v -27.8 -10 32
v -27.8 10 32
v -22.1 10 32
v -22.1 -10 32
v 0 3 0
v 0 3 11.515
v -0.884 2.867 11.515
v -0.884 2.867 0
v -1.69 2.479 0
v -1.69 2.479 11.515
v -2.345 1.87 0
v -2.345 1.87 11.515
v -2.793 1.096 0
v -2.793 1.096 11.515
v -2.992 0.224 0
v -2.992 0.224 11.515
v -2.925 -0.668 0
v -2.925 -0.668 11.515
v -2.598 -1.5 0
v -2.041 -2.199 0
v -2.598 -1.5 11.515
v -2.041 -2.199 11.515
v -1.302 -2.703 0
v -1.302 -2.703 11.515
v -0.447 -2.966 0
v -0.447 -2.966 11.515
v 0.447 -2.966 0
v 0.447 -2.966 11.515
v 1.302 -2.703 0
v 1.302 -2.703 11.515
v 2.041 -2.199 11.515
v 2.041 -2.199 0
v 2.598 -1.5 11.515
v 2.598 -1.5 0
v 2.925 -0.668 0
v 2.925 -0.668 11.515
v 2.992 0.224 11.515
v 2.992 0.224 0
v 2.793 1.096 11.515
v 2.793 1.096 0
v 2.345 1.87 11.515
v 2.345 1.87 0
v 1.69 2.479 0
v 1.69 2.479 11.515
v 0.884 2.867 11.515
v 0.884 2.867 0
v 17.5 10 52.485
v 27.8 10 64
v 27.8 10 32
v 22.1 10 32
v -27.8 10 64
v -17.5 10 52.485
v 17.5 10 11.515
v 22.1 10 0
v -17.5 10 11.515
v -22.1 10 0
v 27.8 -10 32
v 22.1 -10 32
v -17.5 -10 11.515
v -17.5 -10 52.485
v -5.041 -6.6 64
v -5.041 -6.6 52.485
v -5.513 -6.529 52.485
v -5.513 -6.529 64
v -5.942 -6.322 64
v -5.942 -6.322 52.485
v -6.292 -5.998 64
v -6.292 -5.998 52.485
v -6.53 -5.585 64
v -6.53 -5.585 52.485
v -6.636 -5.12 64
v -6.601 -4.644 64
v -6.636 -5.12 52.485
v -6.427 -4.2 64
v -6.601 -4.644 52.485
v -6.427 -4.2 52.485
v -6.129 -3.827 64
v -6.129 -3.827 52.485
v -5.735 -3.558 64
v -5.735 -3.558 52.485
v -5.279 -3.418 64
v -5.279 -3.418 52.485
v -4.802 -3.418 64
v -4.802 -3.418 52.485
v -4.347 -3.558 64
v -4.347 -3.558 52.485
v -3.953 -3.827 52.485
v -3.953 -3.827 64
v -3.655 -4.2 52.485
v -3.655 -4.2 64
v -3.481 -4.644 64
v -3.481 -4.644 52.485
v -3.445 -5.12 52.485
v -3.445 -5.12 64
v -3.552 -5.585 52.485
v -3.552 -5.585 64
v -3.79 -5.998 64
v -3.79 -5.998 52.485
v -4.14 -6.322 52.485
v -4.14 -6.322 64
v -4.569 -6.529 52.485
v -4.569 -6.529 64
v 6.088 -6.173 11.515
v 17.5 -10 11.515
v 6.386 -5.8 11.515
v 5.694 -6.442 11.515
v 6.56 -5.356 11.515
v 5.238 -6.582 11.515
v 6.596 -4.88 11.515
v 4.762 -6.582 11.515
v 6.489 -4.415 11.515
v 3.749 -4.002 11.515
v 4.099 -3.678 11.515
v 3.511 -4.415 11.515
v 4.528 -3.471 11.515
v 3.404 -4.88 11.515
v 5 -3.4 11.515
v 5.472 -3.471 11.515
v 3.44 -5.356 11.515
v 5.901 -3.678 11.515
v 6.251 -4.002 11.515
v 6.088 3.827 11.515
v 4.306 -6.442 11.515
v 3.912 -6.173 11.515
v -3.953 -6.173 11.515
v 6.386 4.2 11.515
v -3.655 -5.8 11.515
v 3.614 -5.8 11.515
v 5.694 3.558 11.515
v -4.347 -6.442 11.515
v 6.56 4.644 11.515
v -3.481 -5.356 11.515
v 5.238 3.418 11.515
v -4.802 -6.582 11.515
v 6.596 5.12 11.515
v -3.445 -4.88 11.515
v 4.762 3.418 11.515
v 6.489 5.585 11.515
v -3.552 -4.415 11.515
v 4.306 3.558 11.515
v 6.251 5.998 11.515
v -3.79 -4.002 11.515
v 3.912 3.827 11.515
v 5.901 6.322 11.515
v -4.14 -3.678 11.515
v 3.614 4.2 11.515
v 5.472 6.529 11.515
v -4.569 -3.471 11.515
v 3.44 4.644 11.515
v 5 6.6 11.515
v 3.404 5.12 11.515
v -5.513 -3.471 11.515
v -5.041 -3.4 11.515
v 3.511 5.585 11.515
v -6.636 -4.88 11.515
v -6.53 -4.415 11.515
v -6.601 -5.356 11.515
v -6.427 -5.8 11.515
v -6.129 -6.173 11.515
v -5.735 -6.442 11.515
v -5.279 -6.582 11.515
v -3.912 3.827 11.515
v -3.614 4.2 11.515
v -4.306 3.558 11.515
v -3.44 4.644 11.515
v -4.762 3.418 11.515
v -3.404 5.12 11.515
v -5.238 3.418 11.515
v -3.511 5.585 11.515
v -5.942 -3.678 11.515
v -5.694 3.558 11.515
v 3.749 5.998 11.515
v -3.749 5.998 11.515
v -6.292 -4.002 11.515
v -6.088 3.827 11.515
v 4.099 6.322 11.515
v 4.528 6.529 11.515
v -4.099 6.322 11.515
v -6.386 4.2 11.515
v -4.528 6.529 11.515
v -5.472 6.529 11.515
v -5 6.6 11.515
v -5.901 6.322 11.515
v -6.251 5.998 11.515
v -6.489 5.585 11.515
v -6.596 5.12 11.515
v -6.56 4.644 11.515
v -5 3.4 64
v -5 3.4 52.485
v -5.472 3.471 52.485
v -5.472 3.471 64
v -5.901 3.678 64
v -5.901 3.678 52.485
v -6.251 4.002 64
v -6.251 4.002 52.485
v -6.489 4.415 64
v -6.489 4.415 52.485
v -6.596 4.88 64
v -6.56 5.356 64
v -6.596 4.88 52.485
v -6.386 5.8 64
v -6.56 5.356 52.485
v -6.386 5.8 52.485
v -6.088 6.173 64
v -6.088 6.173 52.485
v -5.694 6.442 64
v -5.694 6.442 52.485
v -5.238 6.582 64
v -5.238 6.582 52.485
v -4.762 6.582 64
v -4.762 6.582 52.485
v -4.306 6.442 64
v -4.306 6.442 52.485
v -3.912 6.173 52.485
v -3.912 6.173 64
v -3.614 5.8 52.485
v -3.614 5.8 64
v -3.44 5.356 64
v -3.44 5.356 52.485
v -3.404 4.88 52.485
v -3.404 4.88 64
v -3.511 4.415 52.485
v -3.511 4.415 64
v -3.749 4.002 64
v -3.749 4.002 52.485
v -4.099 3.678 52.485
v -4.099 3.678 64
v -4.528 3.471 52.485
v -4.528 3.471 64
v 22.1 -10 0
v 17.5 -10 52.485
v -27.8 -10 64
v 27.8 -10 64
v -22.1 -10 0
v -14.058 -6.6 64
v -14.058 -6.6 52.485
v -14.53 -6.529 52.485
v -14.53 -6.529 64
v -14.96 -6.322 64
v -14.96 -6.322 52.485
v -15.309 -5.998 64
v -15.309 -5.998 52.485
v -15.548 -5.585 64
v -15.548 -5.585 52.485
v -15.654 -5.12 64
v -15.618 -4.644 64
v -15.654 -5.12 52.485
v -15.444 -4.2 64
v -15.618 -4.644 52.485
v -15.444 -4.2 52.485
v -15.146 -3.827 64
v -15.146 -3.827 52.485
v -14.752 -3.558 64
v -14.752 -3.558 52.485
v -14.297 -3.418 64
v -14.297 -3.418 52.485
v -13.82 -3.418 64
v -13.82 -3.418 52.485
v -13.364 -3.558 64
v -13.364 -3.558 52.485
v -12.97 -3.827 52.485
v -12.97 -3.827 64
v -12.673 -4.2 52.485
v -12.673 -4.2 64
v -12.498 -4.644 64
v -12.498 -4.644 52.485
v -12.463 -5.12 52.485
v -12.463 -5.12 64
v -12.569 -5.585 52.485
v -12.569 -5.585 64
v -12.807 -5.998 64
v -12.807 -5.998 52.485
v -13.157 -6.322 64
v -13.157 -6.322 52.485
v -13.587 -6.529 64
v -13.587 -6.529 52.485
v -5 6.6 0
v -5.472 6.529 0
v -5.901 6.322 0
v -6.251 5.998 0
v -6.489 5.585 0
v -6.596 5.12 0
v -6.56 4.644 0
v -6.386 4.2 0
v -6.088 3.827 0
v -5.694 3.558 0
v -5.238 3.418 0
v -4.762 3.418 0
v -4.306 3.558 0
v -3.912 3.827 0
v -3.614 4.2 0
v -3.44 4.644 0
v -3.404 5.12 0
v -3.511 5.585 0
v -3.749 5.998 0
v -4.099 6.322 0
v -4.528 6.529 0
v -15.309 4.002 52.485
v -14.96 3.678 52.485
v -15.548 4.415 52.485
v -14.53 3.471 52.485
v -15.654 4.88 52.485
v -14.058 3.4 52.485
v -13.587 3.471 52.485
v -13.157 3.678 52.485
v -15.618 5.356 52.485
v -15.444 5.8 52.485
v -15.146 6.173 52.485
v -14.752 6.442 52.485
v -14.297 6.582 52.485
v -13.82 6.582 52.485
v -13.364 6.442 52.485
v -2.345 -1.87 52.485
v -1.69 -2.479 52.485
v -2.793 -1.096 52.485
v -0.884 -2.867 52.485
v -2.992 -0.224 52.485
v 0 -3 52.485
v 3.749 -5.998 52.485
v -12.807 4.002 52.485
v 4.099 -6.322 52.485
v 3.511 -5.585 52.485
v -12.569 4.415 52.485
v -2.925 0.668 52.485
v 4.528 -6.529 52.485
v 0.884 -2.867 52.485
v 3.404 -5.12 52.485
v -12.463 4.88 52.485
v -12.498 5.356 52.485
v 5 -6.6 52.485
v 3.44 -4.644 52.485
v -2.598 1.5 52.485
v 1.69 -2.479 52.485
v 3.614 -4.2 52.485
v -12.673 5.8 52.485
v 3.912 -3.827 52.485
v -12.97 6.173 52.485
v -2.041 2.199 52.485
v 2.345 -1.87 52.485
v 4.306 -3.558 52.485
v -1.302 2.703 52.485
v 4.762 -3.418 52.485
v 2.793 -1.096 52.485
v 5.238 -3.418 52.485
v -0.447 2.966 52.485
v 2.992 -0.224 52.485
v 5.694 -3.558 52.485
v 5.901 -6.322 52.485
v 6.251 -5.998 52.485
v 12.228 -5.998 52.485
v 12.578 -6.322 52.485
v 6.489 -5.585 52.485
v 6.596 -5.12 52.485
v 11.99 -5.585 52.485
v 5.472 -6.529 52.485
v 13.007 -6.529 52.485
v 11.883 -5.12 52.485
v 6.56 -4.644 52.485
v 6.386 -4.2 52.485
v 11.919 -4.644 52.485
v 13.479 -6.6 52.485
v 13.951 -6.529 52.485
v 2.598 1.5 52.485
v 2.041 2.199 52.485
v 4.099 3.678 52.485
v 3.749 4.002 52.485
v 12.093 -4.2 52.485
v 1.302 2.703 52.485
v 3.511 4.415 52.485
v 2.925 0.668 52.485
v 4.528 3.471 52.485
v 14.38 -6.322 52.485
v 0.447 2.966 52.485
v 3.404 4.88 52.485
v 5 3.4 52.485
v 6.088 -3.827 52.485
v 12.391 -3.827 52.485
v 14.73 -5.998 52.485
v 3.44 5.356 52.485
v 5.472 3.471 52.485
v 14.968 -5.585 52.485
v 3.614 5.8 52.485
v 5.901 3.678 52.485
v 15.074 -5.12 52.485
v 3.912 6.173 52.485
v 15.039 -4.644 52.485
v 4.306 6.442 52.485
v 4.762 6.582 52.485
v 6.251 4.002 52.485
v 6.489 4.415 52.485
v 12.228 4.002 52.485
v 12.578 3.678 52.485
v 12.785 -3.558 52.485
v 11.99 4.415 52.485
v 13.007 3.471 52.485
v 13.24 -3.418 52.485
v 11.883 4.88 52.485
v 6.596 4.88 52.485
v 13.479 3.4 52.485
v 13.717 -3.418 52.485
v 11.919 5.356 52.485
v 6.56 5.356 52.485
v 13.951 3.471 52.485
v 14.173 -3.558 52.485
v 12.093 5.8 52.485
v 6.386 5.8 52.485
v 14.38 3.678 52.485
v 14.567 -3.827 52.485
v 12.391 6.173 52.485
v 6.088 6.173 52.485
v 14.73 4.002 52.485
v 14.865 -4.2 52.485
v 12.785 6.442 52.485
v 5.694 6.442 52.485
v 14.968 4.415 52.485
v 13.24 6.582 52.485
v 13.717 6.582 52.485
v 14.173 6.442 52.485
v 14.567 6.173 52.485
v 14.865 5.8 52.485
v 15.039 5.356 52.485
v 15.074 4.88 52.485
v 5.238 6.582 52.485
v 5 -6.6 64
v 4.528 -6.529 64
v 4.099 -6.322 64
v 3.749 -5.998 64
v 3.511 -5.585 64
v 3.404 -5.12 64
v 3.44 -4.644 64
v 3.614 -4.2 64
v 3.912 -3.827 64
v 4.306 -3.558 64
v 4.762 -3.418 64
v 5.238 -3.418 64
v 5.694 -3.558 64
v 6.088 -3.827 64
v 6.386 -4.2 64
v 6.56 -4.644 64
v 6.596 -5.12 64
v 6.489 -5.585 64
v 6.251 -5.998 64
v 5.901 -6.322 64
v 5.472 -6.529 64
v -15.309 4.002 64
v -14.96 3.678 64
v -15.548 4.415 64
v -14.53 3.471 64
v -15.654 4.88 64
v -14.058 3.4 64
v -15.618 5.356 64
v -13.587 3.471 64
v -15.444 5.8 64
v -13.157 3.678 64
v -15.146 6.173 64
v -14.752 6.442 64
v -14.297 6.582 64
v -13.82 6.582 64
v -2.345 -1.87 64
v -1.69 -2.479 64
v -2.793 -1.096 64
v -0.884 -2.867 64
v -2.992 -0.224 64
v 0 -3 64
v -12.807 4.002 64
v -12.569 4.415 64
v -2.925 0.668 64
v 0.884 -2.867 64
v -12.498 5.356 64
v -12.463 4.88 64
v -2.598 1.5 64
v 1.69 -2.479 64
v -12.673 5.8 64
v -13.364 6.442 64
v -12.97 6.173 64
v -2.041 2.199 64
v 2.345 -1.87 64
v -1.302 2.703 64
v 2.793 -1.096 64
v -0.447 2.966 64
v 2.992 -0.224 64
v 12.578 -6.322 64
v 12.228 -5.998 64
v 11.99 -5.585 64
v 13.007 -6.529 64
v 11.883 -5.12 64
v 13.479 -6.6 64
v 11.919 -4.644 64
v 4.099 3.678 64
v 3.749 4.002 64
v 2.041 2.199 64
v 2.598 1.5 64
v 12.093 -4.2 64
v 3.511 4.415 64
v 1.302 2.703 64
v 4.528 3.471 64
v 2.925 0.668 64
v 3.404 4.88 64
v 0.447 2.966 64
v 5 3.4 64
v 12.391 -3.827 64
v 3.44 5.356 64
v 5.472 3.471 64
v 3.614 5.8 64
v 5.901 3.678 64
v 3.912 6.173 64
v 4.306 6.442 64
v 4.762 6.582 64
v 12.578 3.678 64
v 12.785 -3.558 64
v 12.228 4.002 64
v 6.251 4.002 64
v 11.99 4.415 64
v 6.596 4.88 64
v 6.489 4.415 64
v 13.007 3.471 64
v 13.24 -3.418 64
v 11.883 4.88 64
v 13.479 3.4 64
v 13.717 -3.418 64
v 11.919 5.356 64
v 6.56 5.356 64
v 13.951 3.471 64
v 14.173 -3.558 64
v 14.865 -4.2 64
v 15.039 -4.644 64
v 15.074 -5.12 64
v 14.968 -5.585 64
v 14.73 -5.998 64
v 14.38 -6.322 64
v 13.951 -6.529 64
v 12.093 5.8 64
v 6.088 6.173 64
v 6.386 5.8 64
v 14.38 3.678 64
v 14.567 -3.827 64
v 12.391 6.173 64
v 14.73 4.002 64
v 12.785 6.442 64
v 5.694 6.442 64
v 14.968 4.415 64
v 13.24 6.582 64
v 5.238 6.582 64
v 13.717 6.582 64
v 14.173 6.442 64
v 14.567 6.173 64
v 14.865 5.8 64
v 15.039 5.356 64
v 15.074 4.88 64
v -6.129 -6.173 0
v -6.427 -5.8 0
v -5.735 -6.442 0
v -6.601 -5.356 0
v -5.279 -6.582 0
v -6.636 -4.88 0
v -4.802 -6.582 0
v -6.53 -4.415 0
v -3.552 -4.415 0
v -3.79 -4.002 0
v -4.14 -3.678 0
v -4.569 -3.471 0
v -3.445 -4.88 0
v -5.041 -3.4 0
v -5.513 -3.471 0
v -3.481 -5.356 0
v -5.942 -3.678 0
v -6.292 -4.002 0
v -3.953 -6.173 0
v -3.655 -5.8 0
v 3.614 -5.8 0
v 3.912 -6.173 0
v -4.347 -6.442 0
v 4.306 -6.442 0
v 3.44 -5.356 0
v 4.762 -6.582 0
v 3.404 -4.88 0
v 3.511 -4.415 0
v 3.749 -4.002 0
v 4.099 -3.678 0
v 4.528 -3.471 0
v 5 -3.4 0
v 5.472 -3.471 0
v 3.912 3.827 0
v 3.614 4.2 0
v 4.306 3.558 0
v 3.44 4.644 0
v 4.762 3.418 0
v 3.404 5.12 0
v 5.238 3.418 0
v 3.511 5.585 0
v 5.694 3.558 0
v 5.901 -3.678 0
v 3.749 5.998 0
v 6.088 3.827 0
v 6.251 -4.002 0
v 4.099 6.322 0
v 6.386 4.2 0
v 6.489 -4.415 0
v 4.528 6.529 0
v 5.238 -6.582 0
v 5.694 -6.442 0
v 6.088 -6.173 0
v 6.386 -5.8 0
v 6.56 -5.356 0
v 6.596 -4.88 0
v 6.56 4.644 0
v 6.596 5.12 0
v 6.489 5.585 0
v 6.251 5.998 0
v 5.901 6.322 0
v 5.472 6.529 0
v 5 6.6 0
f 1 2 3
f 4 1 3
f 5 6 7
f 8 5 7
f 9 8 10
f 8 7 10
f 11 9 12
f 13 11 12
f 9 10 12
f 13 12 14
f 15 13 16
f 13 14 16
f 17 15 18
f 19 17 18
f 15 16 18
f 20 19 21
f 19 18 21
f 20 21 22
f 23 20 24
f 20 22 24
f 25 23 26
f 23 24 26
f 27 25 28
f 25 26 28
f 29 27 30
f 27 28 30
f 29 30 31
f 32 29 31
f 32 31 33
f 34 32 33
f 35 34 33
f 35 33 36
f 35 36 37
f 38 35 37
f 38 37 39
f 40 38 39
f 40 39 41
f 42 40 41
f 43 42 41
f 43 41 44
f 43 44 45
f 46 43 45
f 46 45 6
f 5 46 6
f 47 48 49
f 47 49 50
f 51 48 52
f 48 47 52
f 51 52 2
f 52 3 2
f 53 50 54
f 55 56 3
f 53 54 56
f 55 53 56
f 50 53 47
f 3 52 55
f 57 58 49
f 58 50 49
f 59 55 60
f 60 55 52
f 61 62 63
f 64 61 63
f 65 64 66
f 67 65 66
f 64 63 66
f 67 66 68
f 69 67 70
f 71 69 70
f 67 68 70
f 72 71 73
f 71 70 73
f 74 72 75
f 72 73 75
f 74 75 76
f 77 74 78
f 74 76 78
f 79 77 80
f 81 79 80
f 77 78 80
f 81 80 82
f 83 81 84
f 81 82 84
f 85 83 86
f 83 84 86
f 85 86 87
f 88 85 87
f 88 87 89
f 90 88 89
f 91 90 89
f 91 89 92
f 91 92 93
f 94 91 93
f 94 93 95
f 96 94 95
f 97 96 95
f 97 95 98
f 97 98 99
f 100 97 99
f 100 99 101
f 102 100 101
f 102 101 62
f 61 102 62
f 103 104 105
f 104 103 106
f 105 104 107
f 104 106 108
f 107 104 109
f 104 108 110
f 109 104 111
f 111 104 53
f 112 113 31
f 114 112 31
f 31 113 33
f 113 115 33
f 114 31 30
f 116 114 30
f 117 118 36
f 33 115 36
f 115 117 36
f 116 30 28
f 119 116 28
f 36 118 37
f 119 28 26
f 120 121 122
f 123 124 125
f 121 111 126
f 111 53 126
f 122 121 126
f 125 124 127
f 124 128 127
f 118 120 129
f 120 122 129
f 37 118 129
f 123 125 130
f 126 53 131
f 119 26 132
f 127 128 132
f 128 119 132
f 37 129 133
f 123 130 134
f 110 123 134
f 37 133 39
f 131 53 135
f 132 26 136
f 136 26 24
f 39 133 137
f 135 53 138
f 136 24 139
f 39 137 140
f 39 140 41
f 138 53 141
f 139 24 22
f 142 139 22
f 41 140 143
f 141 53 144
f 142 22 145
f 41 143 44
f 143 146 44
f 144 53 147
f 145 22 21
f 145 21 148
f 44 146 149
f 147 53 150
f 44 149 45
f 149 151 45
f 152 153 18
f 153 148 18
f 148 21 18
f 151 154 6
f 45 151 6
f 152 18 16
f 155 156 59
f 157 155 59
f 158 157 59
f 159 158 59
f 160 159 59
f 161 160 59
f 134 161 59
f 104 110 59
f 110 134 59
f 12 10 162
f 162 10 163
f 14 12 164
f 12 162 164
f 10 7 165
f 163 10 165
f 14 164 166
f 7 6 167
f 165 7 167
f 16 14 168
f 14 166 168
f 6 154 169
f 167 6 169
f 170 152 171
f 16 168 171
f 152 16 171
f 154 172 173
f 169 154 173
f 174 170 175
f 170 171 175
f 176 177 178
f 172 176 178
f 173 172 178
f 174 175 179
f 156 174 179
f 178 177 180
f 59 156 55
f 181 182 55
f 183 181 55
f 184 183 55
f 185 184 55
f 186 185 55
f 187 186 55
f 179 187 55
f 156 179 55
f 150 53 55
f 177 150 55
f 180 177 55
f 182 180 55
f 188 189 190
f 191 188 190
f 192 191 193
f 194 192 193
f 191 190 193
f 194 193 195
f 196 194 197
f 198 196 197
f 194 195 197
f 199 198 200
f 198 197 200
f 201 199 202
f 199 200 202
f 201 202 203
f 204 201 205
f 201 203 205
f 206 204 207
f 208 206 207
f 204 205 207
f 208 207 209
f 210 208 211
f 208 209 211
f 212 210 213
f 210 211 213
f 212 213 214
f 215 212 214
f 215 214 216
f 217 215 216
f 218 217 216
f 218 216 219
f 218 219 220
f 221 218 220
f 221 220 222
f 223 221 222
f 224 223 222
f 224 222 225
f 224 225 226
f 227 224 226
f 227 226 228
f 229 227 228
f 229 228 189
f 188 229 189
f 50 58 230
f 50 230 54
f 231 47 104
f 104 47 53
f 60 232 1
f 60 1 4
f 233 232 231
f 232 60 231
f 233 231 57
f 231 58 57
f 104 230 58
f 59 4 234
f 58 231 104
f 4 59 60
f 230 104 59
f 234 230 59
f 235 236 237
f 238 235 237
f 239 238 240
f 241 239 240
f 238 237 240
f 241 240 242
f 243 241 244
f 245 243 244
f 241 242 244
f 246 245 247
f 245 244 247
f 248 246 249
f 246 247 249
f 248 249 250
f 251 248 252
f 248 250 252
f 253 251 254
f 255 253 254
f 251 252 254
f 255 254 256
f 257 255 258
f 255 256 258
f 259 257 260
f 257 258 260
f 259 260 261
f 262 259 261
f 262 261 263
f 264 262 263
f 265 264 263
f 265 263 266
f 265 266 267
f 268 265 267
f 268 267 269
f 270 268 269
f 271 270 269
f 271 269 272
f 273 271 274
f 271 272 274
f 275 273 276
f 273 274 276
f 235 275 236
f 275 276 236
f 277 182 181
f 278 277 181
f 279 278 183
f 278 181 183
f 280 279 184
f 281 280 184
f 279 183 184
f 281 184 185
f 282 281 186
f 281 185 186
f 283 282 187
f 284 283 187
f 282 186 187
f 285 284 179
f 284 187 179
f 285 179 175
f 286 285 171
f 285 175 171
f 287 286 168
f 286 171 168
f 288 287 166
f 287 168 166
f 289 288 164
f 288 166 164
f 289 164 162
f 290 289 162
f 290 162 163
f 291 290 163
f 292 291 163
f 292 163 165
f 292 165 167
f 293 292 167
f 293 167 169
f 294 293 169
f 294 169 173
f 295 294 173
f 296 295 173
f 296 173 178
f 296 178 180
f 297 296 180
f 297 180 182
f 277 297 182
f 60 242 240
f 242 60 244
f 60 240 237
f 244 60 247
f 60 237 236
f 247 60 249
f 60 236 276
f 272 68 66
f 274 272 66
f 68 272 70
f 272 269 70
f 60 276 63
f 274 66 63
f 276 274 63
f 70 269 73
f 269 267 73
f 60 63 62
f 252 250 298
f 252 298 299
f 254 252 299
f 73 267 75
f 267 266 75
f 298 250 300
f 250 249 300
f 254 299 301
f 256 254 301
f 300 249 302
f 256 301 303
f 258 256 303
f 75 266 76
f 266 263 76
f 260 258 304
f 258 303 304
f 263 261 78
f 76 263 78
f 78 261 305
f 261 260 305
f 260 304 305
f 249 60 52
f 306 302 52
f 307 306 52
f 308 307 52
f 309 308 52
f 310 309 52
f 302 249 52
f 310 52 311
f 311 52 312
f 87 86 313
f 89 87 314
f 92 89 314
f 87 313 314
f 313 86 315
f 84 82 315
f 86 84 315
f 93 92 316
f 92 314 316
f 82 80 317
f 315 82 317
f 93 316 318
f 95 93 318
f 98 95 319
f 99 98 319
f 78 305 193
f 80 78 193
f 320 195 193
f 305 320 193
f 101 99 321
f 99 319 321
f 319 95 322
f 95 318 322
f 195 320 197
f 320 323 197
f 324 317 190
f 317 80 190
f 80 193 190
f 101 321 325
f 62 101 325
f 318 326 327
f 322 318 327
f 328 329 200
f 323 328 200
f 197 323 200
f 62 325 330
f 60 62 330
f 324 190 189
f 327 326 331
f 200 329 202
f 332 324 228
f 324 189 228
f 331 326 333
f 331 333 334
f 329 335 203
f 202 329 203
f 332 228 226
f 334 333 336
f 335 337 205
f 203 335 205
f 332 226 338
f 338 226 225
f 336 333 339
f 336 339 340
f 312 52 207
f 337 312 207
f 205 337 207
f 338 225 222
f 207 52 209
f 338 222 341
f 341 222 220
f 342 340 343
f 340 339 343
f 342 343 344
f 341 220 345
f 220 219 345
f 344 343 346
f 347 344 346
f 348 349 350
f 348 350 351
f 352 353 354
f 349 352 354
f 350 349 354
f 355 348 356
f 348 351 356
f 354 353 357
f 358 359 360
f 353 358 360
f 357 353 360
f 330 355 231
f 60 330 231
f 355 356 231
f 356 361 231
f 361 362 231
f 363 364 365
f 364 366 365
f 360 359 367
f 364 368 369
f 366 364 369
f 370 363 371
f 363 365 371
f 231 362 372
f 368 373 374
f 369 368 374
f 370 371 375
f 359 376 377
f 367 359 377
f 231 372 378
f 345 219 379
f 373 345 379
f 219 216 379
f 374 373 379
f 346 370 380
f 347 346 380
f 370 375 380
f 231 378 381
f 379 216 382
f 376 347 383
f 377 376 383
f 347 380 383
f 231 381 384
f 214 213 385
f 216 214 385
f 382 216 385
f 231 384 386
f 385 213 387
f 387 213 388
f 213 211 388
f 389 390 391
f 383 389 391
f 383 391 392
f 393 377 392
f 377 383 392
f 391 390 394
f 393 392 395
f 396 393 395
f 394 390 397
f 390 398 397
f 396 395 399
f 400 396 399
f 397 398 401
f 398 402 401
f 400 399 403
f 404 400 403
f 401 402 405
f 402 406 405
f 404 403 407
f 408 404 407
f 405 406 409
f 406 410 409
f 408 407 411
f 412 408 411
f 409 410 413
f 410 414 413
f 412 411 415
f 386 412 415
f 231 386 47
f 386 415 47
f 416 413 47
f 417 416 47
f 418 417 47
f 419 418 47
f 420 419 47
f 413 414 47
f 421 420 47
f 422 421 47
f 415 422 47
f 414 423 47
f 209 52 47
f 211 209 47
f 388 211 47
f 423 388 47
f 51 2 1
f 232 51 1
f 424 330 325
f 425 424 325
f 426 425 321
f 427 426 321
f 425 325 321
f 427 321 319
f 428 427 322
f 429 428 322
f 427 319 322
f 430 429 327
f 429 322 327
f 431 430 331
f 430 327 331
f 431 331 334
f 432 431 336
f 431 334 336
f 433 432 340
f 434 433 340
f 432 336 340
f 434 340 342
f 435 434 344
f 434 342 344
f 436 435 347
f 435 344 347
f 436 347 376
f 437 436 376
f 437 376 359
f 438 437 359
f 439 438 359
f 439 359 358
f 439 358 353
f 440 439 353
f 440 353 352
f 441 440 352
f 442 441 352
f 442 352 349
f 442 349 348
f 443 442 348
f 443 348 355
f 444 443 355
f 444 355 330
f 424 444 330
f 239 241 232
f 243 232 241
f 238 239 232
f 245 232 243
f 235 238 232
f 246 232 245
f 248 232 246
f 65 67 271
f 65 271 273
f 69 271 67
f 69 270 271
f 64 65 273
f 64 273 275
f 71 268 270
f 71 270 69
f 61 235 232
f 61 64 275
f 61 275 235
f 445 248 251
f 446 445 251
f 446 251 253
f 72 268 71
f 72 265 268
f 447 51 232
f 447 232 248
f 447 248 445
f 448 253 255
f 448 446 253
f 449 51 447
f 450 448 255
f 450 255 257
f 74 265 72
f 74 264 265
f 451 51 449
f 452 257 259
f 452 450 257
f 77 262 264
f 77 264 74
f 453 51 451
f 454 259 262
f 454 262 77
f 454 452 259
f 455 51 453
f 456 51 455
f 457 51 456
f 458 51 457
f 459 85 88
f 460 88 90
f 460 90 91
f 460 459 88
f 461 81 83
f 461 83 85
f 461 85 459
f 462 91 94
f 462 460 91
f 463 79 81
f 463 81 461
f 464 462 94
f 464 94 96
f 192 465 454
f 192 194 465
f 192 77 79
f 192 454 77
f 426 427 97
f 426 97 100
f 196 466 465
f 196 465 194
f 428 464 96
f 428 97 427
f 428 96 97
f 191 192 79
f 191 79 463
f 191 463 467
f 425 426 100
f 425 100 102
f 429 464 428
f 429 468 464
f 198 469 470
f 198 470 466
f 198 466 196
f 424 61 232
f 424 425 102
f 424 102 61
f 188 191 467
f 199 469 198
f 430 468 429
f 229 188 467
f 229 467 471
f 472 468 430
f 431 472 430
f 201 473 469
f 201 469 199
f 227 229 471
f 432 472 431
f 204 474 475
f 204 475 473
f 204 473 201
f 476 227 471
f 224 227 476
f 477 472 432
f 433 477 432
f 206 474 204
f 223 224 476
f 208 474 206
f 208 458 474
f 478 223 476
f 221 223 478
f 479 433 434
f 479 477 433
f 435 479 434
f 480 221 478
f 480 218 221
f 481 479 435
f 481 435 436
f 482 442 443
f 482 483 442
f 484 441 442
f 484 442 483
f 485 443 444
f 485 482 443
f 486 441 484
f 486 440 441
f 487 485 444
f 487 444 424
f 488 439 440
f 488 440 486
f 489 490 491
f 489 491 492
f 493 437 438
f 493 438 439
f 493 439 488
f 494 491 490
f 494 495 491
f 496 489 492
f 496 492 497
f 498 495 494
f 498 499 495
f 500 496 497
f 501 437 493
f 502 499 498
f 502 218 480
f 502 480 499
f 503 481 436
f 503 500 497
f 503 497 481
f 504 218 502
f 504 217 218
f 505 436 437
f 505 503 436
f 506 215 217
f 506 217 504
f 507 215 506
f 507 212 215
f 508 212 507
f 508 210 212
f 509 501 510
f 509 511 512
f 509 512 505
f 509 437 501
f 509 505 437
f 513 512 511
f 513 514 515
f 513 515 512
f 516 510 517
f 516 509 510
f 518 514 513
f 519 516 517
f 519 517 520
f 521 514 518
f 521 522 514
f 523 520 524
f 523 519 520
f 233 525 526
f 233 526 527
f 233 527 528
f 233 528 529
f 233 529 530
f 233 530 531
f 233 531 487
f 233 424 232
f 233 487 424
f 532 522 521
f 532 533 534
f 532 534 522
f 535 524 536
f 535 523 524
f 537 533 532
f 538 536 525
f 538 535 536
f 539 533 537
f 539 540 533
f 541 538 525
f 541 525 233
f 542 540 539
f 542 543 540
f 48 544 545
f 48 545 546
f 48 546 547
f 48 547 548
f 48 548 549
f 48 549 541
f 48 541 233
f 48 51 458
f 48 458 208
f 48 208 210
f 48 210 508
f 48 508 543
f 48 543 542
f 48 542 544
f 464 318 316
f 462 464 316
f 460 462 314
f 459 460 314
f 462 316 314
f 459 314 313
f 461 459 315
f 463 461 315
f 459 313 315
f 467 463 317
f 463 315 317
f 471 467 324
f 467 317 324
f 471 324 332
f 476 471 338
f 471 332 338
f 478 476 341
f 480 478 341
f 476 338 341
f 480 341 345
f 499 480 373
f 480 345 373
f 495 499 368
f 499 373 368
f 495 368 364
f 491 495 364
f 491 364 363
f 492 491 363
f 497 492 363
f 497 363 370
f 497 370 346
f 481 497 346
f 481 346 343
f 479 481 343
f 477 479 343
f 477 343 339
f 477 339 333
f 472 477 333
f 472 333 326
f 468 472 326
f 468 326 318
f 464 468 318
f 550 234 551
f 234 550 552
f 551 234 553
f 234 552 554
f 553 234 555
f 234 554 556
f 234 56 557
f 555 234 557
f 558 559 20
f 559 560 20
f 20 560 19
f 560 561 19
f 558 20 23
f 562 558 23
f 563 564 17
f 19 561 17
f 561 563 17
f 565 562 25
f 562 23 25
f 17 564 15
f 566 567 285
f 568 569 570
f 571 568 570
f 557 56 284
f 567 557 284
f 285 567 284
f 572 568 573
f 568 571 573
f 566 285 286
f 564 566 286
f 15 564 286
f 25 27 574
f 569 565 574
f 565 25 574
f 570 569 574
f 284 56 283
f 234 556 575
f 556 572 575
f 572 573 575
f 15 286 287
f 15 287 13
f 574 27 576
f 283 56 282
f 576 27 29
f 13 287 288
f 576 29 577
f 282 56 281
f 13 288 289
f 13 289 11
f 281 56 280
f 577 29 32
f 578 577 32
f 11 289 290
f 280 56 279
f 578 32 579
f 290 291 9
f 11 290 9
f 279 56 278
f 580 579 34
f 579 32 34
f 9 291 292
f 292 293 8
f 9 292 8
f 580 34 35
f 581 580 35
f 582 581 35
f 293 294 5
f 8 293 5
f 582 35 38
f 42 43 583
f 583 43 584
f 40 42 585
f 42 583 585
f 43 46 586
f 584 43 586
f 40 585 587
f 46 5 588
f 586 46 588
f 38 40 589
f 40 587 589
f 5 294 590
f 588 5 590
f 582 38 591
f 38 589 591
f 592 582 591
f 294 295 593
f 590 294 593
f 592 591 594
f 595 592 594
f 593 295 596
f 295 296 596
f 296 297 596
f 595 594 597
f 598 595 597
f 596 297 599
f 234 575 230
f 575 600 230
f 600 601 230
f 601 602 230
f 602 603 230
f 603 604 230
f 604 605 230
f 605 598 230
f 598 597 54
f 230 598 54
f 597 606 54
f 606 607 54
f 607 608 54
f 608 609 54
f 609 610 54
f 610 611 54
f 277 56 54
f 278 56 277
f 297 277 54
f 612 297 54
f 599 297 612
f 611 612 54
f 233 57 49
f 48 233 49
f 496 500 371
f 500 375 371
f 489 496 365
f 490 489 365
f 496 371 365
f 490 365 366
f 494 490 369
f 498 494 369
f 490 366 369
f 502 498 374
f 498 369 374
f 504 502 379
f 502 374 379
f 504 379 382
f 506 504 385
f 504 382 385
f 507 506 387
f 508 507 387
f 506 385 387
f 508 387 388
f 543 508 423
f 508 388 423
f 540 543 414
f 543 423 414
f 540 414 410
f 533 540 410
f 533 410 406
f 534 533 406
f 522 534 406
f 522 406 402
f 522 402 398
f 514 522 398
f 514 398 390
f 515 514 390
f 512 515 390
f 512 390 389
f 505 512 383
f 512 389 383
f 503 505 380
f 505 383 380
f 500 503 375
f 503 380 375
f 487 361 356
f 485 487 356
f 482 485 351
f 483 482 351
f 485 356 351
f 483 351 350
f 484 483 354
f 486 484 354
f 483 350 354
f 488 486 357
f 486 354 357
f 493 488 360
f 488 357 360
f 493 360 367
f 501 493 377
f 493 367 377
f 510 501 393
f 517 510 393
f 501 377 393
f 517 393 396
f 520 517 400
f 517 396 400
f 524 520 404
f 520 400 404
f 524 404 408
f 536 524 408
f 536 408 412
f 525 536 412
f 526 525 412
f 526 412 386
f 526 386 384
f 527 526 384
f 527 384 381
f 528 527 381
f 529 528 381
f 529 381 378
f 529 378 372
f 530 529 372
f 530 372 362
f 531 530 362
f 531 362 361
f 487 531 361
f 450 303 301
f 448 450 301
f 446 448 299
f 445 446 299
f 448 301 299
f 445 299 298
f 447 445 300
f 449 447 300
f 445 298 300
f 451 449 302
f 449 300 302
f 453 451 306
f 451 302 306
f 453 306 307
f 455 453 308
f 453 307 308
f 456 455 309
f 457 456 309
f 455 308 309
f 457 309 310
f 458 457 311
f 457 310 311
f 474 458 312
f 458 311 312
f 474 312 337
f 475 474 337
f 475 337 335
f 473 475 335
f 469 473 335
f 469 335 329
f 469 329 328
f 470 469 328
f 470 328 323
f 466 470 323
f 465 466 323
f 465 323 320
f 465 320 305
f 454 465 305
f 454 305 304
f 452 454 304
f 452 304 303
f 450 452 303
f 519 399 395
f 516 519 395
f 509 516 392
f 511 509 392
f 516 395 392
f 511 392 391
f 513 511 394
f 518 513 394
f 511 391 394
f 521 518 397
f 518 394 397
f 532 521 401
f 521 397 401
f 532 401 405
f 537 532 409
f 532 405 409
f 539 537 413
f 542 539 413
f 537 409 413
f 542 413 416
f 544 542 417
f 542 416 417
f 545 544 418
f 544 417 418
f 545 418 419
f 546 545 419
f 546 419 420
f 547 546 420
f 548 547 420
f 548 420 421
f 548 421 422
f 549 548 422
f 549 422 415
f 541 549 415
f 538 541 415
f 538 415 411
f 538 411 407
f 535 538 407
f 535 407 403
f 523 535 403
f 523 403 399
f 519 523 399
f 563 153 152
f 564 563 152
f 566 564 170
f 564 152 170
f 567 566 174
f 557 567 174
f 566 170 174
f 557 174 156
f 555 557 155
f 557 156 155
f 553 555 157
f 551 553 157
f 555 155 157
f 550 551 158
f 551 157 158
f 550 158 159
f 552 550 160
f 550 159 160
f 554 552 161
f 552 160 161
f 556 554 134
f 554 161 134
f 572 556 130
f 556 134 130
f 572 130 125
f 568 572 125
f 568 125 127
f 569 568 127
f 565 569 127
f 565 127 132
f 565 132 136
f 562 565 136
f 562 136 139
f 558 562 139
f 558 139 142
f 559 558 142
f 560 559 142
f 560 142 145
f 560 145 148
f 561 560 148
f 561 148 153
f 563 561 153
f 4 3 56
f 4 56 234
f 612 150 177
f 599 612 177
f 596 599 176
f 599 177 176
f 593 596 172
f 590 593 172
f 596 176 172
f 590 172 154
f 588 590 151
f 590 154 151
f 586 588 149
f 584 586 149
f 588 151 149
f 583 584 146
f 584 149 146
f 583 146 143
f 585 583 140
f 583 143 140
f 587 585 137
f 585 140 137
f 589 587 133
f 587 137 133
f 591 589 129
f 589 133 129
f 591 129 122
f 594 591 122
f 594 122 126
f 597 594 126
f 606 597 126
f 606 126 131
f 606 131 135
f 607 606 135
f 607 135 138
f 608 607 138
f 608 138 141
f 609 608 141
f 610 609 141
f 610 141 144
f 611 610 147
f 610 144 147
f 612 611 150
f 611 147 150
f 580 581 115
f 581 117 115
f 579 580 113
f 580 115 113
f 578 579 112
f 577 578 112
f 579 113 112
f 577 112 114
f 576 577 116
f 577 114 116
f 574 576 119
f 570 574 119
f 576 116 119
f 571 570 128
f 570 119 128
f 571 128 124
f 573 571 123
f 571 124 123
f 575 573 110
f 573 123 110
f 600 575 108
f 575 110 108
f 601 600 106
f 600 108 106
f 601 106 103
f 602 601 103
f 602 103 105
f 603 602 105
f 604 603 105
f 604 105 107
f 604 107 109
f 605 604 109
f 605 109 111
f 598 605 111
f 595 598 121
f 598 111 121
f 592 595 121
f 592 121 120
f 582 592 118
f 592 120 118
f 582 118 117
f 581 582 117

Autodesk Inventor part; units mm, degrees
ref_plane "YZ Plane" through (0, 0, 0) normal (1, 0, 0) x (0, 1, 0)
ref_plane "XZ Plane" through (0, 0, 0) normal (0, 1, 0) x (-1, 0, 0)
ref_plane "XY Plane" through (0, 0, 0) normal (0, 0, 1) x (1, 0, 0)
sketch "スケッチ1" plane through (0, 0, 0) normal (0, 0, 1) x (1, 0, 0)
  line L0 (-22.1, -10) -> (22.1, -10)
  line L1 (22.1, -10) -> (22.1, 10)
  line L2 (22.1, 10) -> (-22.1, 10)
  line L3 (-22.1, 10) -> (-22.1, -10)
  line L4 (-22.1, -10) -> (22.1, 10) construction
  line L5 (22.1, -10) -> (-22.1, 10) construction
  point P0 (0, 0)
  dimension "d0" = 44.2
  dimension "d1" = 20
extrude "押し出し1" add sketch "スケッチ1" along normal blind 32
sketch "スケッチ2" plane through (0, 0, 32) normal (0, 0, 1) x (1, 0, 0)
  line L0 (-27.8, -10) -> (27.8, -10)
  line L1 (27.8, -10) -> (27.8, 10)
  line L2 (27.8, 10) -> (-27.8, 10)
  line L3 (-27.8, 10) -> (-27.8, -10)
  line L4 (-27.8, -10) -> (27.8, 10) construction
  line L5 (27.8, -10) -> (-27.8, 10) construction
  point P0 (0, 0)
  dimension "d4" = 20
  dimension "d5" = 55.6
extrude "押し出し2" add sketch "スケッチ2" along normal blind 32
sketch "スケッチ3" plane through (0, 0, 0) normal (0, 1, 0) x (-1, 0, 0)
  line L0 (22.1, 0) -> (22.1, 32) projected
  line L1 (-17.5, 7.4854) -> (17.5, 7.4854)
  line L2 (17.5, 7.4854) -> (17.5, 56.5146)
  line L3 (17.5, 56.5146) -> (-17.5, 56.5146)
  line L4 (-17.5, 56.5146) -> (-17.5, 7.4854)
  line L5 (-17.5, 7.4854) -> (17.5, 56.5146) construction
  line L6 (17.5, 7.4854) -> (-17.5, 56.5146) construction
  line L7 (-17.5, 11.5146) -> (17.5, 11.5146)
  line L8 (17.5, 11.5146) -> (17.5, 52.4854)
  line L9 (17.5, 52.4854) -> (-17.5, 52.4854)
  line L10 (-17.5, 52.4854) -> (-17.5, 11.5146)
  line L11 (-17.5, 11.5146) -> (17.5, 52.4854) construction
  line L12 (17.5, 11.5146) -> (-17.5, 52.4854) construction
  point P0 (0, 0)
  point P1 (0, 32)
  dimension "d8" = 22.1
  dimension "d9" = 32
  dimension "d10" = 35
  dimension "d11" = 45
extrude "押し出し3" cut sketch "スケッチ3" against normal mid plane 32 contours L4 L9 L2 L7
sketch "スケッチ4" plane through (0, 0, 0) normal (0, 0, -1) x (-1, 0, 0)
  point P0 (0, 0)
  point P1 (0, 0)
hole "穴1" at (0, 0, 0) direction (0, 0, 1) diameter 6 depth 15 tip angle 118
sketch "スケッチ5" plane through (0, 0, 0) normal (0, 0, -1) x (-1, 0, 0)
  point P0 (0, 0)
  point P1 (-5, 5)
  point P2 (-5, -5)
  point P3 (5.0409, -5)
  point P4 (5, 5)
  dimension "d21" = 5
  dimension "d22" = 5
  dimension "d23" = 5
  dimension "d24" = 5
  dimension "d25" = 5.0409
  dimension "d26" = 5
hole "穴2" at (5, 5, 0) at (5, -5, 0) at (-5.0409, -5, 0) at (-5, 5, 0) direction (0, 0, 1) diameter 3.2 depth 15 tip angle 118
sketch "スケッチ6" plane through (0, 0, 64) normal (0, 0, 1) x (1, 0, 0)
  point P0 (0, 0)
  point P1 (0, 0)
hole "穴3" at (0, 0, 64) direction (0, 0, -1) diameter 6 depth 15 tip angle 118
sketch "スケッチ7" plane through (0, 0, 64) normal (0, 0, 1) x (1, 0, 0)
  circle A0 centre (-5.0409, -5) radius 1.6 projected
  circle A1 centre (-5, 5) radius 1.6 projected
  circle A2 centre (5, 5) radius 1.6 projected
  circle A3 centre (5, -5) radius 1.6 projected
  point P0 (0, 0)
  point P1 (-14.0582, -5)
  point P2 (-14.0582, 5)
  point P3 (13.4789, 5)
  point P4 (13.4789, -5)
hole "穴4" at (-5.0409, -5, 64) at (-5, 5, 64) at (5, 5, 64) at (5, -5, 64) at (-14.0582, -5, 64) at (-14.0582, 5, 64) at (13.4789, 5, 64) at (13.4789, -5, 64) direction (0, 0, -1) diameter 3.2 depth 17.1 tip angle 118
properties part number "20220612_サーボ仮"
